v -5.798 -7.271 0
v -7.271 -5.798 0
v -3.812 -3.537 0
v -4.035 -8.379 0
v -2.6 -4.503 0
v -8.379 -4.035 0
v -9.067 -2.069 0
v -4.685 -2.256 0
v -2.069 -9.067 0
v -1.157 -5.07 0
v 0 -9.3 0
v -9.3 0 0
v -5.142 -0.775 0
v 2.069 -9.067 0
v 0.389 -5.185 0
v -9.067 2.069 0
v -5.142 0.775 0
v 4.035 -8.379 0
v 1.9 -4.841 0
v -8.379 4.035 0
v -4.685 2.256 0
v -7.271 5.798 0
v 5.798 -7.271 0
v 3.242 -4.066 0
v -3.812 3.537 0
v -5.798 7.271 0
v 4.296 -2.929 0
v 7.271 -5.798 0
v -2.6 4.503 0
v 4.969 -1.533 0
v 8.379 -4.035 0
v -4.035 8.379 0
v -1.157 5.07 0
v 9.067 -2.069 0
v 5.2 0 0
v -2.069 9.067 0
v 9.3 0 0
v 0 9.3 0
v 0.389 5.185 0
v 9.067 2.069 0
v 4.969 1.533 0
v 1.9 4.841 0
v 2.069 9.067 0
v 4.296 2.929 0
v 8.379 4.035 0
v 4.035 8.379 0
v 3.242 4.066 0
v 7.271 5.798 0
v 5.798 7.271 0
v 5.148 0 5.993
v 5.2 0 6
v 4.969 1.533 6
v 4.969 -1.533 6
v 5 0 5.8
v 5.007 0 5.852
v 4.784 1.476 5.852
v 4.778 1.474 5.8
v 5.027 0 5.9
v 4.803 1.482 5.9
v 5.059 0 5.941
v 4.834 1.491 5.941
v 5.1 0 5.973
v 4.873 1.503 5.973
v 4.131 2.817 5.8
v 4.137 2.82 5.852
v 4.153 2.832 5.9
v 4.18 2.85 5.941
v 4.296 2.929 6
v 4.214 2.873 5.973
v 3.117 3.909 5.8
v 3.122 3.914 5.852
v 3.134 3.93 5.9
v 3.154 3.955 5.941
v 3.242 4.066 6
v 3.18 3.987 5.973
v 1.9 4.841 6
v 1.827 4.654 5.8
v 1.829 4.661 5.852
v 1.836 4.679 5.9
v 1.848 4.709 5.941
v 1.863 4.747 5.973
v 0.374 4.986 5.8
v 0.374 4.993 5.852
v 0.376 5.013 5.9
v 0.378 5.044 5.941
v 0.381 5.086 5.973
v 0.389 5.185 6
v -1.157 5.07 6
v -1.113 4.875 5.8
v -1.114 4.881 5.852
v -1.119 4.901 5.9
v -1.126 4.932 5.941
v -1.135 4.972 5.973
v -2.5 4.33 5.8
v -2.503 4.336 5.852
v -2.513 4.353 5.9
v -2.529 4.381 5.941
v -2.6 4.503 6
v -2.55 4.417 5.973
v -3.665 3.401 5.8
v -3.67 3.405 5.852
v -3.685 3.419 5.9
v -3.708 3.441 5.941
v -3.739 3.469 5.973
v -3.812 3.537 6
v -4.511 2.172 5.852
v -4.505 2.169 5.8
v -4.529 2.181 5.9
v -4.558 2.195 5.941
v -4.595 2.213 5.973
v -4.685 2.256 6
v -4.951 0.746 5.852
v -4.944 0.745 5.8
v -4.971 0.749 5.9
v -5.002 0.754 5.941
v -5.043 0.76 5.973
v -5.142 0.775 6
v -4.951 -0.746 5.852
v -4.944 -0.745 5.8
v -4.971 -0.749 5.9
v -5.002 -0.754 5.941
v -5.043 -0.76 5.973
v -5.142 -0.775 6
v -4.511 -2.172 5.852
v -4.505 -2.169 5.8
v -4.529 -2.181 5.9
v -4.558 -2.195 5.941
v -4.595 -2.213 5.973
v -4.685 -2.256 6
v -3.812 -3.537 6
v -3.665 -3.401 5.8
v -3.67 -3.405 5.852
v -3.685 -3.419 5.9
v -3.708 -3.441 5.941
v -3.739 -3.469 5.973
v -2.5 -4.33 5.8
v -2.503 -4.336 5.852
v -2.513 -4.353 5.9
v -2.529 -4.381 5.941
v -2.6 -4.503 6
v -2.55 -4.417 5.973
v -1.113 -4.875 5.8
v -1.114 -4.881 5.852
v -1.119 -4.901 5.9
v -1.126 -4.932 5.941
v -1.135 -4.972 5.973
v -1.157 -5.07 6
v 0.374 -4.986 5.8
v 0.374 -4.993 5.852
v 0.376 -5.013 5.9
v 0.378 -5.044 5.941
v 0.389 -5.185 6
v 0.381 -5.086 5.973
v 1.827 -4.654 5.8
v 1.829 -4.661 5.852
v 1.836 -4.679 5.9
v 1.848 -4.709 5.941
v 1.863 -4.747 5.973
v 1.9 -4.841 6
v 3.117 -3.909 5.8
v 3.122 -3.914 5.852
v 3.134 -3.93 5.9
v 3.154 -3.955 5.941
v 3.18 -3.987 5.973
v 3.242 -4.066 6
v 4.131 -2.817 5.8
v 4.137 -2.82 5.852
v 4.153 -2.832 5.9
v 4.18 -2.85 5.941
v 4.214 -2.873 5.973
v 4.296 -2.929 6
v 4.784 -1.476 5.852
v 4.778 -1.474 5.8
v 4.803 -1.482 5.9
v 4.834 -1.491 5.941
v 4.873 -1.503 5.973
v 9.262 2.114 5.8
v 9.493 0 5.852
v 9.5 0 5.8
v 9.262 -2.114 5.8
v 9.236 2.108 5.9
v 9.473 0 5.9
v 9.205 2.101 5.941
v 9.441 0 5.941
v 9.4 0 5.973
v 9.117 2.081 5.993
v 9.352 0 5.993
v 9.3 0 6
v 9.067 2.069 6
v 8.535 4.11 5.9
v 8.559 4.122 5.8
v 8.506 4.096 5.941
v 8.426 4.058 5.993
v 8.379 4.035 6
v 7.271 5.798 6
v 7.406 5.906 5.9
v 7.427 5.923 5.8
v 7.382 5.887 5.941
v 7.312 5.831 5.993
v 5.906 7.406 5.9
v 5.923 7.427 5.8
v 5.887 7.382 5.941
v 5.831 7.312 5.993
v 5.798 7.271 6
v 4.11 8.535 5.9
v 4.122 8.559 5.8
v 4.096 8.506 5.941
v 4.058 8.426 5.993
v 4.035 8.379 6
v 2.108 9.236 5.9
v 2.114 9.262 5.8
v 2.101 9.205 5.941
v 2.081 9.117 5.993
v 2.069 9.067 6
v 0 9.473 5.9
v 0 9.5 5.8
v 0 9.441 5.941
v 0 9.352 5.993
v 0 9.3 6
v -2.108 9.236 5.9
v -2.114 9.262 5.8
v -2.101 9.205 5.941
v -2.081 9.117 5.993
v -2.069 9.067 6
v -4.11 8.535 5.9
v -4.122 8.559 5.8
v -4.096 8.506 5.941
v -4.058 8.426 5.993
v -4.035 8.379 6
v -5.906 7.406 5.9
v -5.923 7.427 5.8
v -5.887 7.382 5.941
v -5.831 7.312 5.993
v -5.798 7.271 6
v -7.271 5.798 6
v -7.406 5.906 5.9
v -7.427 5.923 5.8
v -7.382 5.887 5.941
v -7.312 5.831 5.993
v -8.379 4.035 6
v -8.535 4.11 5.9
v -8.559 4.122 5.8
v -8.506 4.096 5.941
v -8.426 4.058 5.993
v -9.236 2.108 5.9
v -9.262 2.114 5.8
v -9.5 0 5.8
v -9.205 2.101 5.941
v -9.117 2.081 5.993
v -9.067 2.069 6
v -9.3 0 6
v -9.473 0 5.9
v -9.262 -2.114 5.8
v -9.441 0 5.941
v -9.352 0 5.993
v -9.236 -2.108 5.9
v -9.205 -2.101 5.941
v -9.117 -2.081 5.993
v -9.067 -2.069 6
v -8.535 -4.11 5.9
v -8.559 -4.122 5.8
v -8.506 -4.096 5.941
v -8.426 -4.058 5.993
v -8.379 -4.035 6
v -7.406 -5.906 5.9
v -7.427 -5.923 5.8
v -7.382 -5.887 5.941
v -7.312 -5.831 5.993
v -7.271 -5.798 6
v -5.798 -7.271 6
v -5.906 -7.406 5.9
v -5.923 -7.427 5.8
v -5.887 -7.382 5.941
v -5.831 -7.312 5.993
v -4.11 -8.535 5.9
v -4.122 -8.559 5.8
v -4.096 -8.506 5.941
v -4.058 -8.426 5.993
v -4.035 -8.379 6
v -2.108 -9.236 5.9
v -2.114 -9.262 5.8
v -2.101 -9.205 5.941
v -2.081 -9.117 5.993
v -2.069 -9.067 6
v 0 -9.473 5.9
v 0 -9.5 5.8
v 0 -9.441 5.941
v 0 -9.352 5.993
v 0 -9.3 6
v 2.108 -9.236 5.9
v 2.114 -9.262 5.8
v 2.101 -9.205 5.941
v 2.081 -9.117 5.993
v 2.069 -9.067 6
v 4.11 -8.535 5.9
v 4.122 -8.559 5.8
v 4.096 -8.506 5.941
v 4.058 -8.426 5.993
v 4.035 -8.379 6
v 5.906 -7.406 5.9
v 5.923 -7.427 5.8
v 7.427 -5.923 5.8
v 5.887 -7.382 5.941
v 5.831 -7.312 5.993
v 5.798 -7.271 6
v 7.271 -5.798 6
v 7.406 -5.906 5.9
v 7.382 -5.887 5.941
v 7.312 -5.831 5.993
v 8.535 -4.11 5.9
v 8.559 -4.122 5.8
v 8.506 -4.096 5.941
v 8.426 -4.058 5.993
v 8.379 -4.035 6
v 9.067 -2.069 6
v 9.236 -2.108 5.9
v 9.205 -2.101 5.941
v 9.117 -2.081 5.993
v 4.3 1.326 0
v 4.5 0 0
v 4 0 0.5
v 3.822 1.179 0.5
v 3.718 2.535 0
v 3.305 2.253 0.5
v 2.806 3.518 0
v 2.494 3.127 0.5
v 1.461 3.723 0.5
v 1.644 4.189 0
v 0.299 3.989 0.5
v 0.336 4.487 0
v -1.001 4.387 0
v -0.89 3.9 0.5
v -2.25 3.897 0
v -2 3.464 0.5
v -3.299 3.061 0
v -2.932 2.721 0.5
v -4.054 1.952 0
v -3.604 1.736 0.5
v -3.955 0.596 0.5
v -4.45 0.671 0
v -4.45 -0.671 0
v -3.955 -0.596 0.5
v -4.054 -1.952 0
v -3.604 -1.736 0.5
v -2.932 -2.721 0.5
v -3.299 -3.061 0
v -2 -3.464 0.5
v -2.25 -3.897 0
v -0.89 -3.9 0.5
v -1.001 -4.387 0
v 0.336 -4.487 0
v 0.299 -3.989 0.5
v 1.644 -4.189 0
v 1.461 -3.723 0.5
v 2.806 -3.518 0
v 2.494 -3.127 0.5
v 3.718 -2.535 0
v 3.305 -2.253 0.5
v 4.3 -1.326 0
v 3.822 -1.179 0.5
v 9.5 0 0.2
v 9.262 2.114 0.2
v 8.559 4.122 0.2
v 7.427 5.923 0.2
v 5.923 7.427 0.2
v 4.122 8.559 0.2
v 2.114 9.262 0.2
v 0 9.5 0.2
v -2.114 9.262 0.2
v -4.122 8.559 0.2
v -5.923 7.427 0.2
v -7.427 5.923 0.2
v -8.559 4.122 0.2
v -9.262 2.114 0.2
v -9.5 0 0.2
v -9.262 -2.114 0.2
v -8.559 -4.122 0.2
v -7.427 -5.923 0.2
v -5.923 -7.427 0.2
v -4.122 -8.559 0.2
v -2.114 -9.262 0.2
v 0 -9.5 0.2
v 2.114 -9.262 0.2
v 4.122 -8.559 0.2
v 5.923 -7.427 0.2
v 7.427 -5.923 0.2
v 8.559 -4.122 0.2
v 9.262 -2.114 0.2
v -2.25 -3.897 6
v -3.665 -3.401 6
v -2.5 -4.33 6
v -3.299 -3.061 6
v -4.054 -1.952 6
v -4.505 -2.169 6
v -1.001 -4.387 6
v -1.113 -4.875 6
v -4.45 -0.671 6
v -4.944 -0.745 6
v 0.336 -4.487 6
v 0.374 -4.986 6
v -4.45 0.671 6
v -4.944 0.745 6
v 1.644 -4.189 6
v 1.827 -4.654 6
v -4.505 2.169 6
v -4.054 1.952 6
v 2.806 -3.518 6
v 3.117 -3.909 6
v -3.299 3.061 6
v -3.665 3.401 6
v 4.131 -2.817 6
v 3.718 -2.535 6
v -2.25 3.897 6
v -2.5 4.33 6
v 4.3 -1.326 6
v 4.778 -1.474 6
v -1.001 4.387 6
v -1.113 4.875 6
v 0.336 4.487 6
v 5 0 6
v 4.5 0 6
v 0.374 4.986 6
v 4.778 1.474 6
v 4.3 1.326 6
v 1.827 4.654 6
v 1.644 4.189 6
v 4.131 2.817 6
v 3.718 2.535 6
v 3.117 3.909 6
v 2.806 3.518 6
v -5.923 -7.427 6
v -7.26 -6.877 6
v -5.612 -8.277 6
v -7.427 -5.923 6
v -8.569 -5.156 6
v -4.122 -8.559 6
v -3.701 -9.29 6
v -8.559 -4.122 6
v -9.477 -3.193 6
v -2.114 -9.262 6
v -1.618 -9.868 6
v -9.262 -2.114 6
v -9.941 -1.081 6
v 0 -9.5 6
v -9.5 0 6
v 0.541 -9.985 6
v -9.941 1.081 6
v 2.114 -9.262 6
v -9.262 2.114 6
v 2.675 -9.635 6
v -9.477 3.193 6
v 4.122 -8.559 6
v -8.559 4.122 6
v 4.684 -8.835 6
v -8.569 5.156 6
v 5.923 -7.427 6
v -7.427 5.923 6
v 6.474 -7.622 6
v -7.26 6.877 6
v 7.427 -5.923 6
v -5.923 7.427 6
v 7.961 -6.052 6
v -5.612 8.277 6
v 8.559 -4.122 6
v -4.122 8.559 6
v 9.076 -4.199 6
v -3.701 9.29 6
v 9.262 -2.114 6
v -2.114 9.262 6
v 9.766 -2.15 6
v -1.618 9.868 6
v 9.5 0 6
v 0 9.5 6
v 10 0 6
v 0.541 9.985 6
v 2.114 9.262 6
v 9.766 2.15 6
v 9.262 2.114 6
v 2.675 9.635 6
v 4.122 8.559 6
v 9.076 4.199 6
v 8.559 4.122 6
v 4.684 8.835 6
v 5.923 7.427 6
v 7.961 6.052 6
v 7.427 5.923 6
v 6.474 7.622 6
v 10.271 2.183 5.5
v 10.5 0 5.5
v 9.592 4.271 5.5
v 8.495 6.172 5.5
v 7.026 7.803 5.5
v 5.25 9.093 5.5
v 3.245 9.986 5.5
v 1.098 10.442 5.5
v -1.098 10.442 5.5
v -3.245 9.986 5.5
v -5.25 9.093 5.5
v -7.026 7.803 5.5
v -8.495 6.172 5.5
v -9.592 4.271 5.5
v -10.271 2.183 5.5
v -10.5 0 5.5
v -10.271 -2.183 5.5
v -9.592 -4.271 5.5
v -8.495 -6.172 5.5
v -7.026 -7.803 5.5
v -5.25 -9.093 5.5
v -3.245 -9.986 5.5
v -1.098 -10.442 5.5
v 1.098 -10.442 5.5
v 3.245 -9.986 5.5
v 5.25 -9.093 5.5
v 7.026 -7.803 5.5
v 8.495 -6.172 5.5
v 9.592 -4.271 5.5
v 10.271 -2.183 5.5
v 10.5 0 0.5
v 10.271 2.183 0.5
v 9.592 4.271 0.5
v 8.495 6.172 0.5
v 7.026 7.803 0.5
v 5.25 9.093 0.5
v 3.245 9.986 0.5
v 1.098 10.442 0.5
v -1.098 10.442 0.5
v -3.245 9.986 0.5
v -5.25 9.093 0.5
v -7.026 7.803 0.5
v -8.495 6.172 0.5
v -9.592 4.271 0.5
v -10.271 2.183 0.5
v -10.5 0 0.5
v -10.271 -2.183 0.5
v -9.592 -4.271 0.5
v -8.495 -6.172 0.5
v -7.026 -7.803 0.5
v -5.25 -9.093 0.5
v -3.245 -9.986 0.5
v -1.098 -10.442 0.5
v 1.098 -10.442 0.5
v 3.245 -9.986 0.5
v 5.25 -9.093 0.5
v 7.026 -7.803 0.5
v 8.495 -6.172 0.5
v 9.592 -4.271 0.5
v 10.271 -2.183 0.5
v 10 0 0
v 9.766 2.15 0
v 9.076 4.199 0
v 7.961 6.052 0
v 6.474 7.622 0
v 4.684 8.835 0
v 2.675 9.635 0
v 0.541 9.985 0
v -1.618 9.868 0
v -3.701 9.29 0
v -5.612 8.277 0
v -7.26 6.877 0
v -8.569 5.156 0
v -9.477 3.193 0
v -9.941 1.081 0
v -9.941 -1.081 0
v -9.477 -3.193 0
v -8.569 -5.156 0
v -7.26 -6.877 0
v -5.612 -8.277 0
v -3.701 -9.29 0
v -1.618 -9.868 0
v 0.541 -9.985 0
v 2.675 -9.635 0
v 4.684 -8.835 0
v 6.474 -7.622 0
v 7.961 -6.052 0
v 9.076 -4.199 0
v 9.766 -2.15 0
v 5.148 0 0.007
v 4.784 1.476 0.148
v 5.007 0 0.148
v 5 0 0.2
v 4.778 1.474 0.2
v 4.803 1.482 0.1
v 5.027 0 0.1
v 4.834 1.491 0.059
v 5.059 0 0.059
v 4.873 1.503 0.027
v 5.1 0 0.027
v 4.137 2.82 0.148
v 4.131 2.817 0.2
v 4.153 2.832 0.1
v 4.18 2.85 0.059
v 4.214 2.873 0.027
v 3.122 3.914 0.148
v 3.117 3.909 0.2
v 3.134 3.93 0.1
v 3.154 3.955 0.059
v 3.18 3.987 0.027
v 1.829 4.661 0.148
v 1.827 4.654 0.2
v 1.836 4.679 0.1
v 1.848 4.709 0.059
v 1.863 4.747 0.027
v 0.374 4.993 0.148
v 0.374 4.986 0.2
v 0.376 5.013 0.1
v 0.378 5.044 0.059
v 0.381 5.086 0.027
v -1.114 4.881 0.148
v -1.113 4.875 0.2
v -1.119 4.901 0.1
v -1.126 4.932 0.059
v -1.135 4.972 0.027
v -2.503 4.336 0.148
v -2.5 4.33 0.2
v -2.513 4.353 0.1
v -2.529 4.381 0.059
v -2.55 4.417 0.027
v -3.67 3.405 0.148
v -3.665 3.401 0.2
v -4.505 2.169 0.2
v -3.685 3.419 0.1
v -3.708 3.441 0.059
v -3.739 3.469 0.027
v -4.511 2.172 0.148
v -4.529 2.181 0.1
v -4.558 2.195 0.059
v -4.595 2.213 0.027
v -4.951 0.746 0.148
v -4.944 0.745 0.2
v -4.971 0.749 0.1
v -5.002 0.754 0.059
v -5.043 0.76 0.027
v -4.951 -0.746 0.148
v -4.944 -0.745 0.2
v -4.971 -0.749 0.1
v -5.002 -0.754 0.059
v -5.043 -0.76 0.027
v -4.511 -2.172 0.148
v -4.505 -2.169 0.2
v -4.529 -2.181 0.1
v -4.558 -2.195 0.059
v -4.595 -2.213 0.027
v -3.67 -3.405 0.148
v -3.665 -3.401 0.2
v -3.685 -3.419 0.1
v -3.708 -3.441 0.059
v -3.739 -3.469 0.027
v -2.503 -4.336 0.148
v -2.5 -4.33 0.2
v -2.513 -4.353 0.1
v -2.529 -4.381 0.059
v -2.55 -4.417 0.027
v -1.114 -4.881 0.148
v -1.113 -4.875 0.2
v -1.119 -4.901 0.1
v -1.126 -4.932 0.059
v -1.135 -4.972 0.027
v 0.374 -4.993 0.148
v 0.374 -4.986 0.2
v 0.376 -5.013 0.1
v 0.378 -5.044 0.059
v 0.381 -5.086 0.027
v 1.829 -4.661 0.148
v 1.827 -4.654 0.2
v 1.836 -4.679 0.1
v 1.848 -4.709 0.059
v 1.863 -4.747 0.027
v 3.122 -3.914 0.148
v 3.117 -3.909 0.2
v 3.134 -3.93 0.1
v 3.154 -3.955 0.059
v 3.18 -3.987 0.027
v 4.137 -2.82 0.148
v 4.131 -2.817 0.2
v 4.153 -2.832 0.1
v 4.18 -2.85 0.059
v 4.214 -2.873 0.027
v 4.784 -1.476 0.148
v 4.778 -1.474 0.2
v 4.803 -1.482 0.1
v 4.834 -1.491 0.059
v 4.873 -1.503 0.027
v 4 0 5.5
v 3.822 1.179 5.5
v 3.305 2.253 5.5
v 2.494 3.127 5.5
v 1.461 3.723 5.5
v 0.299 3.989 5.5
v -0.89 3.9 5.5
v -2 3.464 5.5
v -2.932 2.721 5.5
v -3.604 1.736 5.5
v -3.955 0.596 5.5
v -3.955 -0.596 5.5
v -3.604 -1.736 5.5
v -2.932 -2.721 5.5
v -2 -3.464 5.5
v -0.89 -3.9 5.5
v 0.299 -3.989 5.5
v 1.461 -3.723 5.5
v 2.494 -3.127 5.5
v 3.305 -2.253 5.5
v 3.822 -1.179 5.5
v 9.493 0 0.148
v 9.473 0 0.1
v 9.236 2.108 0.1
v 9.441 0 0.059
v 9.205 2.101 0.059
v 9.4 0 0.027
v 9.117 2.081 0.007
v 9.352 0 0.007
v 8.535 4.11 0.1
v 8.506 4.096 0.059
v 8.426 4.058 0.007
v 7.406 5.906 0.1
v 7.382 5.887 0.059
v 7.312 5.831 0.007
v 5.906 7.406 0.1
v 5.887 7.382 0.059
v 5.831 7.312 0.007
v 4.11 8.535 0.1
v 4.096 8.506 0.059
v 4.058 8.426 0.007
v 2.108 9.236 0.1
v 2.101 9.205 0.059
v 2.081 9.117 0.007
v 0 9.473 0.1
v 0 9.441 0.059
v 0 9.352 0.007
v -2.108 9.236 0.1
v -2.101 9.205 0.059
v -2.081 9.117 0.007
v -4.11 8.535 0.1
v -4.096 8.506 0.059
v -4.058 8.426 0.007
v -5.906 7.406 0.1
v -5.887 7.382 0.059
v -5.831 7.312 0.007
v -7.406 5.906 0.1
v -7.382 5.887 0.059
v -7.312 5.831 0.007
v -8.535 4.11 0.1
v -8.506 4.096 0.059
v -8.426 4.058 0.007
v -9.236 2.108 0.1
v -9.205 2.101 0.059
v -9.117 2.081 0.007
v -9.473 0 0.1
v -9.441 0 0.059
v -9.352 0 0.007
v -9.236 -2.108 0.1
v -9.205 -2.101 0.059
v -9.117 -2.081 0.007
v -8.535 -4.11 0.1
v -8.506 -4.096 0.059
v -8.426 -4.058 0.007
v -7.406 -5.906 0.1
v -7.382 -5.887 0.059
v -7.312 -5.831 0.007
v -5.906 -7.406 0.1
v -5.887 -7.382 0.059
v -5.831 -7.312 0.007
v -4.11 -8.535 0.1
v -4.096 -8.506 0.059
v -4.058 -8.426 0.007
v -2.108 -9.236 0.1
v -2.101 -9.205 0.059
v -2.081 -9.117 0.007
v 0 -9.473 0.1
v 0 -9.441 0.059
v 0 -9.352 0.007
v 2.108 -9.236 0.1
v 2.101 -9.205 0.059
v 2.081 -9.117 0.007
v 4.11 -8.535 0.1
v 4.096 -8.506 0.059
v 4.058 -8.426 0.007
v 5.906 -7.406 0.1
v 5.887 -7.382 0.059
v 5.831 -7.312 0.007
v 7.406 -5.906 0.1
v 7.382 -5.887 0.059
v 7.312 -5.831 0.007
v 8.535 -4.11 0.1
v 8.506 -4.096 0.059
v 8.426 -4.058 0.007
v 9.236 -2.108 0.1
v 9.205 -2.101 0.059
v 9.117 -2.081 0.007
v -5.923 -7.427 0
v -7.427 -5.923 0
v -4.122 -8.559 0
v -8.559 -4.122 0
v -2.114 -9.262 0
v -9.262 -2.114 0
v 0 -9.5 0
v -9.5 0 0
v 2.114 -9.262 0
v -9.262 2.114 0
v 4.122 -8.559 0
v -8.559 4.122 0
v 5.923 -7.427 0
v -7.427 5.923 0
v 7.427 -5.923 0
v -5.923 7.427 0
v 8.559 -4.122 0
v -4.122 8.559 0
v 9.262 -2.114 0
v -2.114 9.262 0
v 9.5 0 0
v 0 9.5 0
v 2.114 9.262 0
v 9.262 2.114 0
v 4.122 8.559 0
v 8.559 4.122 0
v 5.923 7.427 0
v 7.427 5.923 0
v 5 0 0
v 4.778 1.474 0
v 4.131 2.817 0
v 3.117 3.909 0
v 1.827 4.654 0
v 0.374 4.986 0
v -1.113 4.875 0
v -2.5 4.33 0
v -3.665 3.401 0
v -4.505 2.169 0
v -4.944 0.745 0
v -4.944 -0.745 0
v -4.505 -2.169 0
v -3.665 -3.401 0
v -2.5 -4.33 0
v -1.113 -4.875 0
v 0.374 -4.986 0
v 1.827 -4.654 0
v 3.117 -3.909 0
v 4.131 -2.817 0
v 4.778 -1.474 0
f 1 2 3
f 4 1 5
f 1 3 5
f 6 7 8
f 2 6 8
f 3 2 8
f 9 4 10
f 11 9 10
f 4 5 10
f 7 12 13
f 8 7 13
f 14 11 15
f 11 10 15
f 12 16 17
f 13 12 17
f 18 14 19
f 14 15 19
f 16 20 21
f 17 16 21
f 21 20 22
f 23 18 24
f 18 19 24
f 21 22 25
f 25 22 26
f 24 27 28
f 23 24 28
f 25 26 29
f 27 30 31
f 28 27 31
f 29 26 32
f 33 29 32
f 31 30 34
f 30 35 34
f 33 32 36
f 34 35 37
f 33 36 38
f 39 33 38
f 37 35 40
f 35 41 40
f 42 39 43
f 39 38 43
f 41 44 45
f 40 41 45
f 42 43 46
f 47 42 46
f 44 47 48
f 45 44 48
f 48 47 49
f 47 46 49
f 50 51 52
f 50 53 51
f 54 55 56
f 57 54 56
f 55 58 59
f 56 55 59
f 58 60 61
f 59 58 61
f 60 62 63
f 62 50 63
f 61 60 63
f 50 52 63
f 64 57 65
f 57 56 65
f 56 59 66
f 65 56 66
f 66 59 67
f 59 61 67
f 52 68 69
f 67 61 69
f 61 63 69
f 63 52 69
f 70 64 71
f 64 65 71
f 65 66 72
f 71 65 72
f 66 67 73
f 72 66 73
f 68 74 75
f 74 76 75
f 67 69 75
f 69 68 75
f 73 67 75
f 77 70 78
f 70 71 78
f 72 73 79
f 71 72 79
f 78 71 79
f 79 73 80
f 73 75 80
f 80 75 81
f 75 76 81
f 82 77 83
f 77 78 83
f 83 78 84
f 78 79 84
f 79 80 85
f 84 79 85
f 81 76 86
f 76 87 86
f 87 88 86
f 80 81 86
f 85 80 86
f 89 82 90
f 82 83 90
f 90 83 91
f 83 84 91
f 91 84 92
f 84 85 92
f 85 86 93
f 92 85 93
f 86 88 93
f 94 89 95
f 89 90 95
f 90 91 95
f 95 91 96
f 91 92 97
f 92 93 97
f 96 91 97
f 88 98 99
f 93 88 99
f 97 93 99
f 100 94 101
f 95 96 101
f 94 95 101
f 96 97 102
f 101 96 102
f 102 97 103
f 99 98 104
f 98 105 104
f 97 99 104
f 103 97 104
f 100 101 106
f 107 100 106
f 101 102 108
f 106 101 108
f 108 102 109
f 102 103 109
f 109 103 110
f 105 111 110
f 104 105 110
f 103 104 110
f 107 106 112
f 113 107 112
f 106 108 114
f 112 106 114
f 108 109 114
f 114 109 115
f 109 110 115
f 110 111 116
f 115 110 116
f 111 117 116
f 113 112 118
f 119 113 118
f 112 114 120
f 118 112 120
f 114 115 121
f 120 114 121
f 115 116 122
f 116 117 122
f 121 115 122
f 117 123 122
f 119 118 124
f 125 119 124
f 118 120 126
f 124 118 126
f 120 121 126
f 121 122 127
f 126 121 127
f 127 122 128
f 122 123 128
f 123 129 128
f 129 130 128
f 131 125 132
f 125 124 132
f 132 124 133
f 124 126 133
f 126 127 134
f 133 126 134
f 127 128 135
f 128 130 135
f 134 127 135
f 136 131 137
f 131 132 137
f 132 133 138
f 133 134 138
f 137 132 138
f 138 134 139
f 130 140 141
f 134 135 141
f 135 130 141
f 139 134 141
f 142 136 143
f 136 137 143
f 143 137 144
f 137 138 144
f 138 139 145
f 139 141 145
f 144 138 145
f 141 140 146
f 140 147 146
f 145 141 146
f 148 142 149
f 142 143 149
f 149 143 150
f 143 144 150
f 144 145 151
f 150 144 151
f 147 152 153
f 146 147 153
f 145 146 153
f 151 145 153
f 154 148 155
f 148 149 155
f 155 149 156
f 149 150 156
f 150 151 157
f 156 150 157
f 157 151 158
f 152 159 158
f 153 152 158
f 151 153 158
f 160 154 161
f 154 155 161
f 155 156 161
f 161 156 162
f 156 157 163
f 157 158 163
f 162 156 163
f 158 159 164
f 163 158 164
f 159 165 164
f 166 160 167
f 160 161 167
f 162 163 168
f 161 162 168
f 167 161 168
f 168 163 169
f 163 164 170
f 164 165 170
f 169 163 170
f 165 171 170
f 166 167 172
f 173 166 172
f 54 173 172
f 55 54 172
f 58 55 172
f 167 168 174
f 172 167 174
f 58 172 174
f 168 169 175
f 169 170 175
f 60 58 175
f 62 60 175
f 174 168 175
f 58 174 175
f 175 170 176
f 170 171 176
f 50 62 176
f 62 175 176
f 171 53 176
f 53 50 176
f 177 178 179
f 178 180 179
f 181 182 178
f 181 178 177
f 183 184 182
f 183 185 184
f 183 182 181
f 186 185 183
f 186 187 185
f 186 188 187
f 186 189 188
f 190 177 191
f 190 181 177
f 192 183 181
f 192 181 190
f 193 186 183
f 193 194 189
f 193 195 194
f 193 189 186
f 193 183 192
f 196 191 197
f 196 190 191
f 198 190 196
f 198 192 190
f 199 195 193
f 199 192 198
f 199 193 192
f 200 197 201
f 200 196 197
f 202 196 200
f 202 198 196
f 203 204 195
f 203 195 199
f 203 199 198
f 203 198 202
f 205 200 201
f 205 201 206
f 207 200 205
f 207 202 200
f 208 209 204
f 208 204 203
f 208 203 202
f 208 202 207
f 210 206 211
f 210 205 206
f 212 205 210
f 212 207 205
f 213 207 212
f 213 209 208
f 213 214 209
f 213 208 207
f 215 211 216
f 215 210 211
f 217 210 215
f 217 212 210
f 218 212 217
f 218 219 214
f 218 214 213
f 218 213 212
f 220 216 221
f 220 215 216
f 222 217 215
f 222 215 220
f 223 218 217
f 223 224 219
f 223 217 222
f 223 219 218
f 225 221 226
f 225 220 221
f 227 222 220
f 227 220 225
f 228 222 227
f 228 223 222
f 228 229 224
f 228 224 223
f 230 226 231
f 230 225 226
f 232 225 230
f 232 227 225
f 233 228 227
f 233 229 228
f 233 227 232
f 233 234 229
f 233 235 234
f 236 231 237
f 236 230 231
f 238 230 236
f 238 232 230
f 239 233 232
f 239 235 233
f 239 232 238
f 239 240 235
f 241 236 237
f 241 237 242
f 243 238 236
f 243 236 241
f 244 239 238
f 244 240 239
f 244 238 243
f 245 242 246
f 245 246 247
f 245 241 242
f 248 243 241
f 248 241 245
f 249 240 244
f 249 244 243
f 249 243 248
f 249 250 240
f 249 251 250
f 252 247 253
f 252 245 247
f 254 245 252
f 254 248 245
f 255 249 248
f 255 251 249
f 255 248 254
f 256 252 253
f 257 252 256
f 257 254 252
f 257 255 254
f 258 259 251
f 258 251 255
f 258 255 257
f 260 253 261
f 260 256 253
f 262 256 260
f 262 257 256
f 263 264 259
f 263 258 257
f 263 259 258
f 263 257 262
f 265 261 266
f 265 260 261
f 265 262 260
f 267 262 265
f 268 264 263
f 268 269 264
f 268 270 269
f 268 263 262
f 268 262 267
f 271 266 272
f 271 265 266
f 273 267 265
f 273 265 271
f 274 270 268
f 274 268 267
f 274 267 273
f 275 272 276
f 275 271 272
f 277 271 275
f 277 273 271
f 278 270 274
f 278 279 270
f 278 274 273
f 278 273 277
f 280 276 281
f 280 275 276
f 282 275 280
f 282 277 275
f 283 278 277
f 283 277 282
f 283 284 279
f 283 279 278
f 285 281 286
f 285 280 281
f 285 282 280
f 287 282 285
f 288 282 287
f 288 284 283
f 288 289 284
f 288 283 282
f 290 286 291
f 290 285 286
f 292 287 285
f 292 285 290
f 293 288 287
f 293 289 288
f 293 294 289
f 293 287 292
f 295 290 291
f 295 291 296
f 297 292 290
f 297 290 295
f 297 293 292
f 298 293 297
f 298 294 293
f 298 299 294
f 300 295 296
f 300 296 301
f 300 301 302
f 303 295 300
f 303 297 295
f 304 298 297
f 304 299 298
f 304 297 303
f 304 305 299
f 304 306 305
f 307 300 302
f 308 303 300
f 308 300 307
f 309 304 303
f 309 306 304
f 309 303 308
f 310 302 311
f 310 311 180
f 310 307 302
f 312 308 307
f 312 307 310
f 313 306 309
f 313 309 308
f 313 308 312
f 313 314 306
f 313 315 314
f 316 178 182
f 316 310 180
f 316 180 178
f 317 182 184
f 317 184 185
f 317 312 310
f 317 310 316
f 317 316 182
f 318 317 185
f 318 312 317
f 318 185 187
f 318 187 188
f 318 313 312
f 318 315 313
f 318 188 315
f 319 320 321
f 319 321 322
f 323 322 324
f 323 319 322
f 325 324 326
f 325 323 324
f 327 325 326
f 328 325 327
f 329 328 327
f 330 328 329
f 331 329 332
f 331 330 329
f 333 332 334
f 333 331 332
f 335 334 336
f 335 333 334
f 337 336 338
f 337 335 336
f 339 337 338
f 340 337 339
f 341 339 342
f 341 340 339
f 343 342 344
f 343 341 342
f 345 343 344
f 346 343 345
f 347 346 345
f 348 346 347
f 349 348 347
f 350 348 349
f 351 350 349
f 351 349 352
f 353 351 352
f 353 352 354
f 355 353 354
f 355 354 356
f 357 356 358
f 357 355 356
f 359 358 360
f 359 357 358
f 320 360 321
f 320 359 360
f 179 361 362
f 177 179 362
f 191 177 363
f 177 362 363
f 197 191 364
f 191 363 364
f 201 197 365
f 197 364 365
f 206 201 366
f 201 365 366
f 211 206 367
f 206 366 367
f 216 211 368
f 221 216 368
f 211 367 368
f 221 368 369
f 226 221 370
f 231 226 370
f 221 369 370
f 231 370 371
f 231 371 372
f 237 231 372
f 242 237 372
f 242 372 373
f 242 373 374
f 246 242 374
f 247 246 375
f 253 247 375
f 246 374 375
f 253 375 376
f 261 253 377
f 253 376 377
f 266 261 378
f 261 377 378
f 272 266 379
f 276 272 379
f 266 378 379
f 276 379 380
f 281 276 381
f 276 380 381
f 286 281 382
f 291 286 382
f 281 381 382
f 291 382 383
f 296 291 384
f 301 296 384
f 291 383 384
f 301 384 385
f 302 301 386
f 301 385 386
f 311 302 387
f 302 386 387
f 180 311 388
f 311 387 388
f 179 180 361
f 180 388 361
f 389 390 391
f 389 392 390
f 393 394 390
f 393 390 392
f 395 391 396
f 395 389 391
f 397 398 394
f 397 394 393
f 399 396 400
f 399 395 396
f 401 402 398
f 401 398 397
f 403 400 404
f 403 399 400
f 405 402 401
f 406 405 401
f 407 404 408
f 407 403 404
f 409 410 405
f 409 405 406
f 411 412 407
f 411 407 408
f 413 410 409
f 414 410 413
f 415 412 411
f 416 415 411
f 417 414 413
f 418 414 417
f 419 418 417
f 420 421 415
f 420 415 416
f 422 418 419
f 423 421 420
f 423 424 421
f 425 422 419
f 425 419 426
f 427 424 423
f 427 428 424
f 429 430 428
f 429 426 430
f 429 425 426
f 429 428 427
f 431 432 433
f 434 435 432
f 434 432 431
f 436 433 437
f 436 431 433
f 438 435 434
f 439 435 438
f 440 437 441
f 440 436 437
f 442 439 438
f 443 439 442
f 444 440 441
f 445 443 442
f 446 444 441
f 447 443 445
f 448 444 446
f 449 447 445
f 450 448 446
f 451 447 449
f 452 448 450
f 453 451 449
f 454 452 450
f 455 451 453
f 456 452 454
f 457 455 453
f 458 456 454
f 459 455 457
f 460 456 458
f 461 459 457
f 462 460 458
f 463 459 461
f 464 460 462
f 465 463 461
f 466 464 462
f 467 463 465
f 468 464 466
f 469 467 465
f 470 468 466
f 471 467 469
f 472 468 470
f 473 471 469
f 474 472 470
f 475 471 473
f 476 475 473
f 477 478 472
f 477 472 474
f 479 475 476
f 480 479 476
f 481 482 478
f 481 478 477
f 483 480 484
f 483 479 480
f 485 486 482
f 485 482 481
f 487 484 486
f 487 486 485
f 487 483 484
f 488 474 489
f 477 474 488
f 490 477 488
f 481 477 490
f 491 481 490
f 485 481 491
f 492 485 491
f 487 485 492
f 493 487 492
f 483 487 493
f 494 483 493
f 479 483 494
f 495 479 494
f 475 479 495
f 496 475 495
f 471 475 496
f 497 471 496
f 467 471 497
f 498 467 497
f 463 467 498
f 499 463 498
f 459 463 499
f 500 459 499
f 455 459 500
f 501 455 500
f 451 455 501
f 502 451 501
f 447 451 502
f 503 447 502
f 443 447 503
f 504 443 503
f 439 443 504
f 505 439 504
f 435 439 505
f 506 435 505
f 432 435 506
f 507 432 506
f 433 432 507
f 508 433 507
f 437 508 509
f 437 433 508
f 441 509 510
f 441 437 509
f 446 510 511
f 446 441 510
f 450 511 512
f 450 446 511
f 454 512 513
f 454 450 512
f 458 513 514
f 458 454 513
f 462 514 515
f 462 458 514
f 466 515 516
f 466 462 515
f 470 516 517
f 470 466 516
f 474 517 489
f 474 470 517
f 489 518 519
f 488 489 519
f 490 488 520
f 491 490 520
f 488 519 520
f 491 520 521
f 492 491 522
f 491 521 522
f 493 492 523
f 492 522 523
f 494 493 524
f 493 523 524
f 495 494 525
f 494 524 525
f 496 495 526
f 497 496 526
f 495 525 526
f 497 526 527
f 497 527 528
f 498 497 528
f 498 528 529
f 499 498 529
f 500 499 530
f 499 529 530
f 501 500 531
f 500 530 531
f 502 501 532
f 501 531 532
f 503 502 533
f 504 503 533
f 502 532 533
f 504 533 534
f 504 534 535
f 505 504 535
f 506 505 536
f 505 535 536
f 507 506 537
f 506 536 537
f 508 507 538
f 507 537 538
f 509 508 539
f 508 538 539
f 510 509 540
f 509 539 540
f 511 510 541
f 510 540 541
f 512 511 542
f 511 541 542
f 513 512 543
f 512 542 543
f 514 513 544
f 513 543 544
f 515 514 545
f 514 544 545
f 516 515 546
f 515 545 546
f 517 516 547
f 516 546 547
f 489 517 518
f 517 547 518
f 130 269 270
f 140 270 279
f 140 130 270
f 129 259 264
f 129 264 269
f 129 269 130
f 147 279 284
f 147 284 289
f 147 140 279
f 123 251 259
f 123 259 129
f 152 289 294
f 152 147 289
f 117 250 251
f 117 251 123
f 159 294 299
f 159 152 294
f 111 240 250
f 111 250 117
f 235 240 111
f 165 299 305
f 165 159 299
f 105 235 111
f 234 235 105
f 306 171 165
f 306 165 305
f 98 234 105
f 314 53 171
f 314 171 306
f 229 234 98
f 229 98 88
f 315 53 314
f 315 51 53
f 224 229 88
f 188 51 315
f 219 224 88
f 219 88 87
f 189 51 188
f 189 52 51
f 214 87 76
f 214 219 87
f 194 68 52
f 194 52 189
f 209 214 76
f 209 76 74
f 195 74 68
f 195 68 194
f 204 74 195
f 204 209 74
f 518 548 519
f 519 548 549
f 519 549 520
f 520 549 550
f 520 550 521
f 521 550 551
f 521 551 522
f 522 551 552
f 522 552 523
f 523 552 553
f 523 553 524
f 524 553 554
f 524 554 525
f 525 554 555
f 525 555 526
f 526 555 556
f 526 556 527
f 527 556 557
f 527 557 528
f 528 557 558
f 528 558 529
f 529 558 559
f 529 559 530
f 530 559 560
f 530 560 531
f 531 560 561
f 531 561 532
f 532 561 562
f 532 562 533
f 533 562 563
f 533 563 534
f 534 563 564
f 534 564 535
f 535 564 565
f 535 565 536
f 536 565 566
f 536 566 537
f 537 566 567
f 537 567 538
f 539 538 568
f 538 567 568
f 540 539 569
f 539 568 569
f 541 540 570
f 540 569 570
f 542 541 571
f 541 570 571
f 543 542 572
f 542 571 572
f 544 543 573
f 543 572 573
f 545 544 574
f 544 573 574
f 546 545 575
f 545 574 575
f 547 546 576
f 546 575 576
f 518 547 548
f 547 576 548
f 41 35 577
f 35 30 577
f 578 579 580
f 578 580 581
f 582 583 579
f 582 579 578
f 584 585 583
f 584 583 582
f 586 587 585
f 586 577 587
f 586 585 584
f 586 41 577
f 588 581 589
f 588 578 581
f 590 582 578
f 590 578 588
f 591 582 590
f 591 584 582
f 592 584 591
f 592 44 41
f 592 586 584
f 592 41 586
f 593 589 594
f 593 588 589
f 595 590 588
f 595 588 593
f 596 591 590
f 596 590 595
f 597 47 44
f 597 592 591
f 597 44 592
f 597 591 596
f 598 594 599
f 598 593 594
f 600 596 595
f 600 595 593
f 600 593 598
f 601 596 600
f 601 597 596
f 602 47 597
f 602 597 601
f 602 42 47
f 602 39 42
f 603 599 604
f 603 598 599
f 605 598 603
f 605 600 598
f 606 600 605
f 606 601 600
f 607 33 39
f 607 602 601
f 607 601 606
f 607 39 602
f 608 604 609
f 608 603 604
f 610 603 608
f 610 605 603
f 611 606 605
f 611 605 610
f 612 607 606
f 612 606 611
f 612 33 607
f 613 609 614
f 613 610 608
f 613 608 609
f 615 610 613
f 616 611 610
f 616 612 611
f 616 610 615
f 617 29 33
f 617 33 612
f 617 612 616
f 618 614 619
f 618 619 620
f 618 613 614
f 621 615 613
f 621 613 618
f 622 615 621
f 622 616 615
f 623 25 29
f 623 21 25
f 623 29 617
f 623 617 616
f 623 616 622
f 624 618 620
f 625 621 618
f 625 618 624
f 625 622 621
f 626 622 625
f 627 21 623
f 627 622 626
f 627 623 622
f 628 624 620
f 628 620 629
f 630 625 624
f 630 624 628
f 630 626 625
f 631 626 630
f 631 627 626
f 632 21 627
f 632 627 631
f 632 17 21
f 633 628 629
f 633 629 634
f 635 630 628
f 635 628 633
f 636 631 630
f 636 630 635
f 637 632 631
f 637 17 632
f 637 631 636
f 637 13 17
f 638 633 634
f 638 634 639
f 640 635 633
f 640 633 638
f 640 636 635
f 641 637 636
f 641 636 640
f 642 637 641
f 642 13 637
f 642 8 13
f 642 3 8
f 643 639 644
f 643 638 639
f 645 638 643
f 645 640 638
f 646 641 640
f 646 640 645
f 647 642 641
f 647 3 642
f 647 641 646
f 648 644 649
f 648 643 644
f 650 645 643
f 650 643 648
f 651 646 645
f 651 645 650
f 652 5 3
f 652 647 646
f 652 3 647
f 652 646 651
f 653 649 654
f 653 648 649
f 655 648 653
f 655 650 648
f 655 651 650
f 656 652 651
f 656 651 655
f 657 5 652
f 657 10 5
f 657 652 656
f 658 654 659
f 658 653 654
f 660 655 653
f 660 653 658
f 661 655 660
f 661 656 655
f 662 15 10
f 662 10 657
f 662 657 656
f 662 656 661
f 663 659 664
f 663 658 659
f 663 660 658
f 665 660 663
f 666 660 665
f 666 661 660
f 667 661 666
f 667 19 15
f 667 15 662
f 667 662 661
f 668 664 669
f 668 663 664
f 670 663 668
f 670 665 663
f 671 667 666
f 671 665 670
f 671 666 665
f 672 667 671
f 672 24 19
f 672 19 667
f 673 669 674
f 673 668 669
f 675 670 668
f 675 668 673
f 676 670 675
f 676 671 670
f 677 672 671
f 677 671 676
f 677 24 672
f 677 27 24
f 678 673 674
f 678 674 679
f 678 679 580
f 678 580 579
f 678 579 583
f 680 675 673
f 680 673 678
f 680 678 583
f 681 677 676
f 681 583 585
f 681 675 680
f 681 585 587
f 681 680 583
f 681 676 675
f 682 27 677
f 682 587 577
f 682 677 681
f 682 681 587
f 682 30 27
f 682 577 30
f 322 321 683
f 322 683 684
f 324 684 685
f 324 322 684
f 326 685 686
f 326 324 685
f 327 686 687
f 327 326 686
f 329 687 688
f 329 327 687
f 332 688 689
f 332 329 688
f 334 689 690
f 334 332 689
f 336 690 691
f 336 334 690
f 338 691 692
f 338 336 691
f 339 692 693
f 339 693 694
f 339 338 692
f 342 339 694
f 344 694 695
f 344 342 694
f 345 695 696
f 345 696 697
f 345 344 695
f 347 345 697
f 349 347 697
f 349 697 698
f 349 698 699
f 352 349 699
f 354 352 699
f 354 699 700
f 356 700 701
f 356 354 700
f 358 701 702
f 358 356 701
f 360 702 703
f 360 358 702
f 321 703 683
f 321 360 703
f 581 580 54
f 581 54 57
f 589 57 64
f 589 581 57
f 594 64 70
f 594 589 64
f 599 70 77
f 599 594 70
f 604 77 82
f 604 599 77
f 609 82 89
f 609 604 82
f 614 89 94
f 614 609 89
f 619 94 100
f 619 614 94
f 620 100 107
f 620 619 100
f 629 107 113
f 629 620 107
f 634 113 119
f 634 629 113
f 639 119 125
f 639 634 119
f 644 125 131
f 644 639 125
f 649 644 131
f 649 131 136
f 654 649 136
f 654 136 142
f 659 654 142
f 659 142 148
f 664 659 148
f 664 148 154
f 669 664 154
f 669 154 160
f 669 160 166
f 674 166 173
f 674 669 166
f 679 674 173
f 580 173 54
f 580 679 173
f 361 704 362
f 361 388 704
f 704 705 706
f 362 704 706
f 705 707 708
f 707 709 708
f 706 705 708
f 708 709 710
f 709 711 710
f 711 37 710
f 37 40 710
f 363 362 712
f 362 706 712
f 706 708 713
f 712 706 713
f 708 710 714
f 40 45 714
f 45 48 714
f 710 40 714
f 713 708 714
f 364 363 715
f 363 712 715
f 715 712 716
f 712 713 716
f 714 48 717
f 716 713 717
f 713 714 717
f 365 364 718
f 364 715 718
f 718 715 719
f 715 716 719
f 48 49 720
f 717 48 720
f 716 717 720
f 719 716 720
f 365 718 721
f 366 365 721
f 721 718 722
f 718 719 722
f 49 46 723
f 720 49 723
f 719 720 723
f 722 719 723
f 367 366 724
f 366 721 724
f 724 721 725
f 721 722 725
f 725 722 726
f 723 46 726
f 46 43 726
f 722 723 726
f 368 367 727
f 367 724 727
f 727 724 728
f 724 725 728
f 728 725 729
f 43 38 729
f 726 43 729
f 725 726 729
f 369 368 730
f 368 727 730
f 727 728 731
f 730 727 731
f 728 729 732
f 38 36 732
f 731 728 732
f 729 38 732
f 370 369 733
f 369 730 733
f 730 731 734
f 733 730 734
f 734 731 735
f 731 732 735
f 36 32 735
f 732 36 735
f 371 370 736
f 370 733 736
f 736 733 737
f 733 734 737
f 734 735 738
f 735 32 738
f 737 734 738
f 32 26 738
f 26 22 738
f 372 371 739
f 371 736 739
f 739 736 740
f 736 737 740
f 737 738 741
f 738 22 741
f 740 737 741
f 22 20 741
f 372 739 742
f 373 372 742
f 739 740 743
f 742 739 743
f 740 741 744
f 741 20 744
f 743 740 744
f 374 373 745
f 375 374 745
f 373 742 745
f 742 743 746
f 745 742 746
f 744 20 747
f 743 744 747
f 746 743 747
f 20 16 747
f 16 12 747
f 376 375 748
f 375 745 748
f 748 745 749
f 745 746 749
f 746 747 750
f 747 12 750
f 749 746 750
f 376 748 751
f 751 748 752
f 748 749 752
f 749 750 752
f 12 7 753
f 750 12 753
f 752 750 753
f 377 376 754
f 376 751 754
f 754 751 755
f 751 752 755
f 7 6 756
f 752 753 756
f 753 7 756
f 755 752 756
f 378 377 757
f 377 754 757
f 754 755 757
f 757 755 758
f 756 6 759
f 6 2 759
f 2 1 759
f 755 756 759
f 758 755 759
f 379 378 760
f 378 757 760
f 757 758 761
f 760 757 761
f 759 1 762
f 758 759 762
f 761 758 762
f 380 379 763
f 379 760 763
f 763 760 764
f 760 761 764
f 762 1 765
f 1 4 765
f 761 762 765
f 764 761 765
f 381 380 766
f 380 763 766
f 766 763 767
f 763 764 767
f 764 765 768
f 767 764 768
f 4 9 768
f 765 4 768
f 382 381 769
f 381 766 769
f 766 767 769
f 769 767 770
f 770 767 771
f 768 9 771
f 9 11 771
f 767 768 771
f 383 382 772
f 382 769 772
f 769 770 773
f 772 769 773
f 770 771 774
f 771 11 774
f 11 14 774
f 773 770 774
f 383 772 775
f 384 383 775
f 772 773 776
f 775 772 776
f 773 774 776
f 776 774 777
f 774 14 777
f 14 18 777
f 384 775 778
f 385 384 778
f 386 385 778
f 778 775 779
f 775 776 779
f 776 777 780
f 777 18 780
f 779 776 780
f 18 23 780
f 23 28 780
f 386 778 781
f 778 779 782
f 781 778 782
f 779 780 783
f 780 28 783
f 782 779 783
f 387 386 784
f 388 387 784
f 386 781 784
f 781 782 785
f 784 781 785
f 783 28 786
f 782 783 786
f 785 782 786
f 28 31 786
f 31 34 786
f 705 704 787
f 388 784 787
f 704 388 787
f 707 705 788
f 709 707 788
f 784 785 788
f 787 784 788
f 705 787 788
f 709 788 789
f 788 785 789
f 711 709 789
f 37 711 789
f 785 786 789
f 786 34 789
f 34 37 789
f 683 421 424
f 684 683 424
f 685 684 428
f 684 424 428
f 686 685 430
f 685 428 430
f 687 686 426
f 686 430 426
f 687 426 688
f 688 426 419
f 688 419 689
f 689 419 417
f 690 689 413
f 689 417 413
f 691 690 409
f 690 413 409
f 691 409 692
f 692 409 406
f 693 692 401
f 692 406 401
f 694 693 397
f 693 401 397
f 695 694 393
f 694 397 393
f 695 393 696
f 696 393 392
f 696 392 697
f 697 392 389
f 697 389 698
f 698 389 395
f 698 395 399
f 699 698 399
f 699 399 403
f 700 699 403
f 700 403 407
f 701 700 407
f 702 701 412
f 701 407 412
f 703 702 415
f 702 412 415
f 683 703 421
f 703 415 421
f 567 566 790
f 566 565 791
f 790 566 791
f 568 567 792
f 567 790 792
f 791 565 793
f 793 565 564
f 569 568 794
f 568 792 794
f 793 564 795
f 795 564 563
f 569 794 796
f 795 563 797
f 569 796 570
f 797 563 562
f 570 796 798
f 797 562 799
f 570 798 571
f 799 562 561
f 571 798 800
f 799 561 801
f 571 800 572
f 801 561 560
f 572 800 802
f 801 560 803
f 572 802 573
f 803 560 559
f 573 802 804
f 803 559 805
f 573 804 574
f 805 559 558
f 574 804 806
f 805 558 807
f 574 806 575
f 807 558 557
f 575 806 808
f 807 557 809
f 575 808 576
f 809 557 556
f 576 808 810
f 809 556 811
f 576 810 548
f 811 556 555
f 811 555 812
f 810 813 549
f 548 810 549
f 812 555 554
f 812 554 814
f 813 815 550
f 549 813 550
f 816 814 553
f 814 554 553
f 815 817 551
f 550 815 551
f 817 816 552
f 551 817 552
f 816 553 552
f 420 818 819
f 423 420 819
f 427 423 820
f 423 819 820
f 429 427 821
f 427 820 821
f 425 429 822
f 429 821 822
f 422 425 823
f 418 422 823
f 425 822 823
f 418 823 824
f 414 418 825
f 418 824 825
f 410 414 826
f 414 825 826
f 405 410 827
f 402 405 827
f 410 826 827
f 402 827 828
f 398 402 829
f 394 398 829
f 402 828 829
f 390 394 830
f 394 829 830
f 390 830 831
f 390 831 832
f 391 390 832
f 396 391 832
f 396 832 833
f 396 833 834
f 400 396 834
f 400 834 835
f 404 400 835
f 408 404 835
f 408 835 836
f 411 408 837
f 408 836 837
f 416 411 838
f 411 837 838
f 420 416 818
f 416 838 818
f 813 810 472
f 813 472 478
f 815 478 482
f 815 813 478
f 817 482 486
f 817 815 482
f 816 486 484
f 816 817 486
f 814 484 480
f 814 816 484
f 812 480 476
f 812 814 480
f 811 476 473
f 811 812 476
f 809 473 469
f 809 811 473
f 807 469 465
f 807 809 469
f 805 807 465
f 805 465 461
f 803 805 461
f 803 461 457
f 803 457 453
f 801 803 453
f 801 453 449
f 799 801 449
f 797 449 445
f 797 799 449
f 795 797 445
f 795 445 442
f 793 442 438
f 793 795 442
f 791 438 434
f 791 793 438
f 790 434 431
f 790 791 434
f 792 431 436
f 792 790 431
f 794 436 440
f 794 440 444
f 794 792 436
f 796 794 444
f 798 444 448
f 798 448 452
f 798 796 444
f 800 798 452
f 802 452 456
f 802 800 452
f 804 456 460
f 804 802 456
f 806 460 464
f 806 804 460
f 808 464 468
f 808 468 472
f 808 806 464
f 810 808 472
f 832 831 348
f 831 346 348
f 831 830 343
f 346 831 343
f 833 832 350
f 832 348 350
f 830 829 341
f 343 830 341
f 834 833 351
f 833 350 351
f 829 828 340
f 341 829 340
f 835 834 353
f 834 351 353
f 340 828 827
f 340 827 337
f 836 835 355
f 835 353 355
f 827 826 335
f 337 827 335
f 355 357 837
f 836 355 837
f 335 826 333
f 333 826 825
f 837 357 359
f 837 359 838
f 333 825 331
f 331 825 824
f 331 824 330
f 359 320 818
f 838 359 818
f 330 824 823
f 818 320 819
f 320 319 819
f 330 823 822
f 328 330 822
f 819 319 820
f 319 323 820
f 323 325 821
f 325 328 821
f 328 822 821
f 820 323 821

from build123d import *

# Parameters (mm, degrees)
SKETCH1_R             = 5
SKETCH1_R_2           = 4
BOSS_EXTRUDE1_DEPTH   = 6
SKETCH1_R_3           = 10.5
SKETCH1_R_4           = 9.5
BOSS_EXTRUDE1_2_DEPTH = 6
SKETCH2_R             = 9.5
SKETCH2_R_2           = 5
BOSS_EXTRUDE2_DEPTH   = 6
CHAMFER1_SIZE         = 0.5
CHAMFER2_SIZE         = 0.5
FILLET1_R             = 0.2


with BuildPart() as part:
    # Sketch1 → Boss-Extrude1 (new body)
    with BuildSketch(Plane.XY):
        Circle(SKETCH1_R)
        Circle(SKETCH1_R_2, mode=Mode.SUBTRACT)
    extrude(amount=BOSS_EXTRUDE1_DEPTH)

    # Chamfer2
    chamfer2_edges = [part.edges().sort_by_distance(p)[0] for p in [
        (-4, 0, 0),
        (-4, 0, 6),
    ]]
    chamfer(chamfer2_edges, length=CHAMFER2_SIZE)


with BuildPart() as body_2:
    # Sketch1 → Boss-Extrude1 2 (new body)
    with BuildSketch(Plane.XY):
        Circle(SKETCH1_R_3)
        Circle(SKETCH1_R_4, mode=Mode.SUBTRACT)
    extrude(amount=BOSS_EXTRUDE1_2_DEPTH)

    # Chamfer1
    chamfer1_edges = [body_2.edges().sort_by_distance(p)[0] for p in [
        (-10.5, 0, 0),
        (-10.5, 0, 6),
    ]]
    chamfer(chamfer1_edges, length=CHAMFER1_SIZE)


with BuildPart() as body_3:
    # Sketch2 → Boss-Extrude2 (new body)
    with BuildSketch(Plane.XY):
        Circle(SKETCH2_R)
        Circle(SKETCH2_R_2, mode=Mode.SUBTRACT)
    extrude(amount=BOSS_EXTRUDE2_DEPTH)

    # Fillet1
    fillet1_edges = [body_3.edges().sort_by_distance(p)[0] for p in [
        (-9.5, 0, 0),
        (-9.5, 0, 6),
        (-5, 0, 0),
        (-5, 0, 6),
    ]]
    fillet(fillet1_edges, radius=FILLET1_R)


solid = Compound([part.part, body_2.part, body_3.part])
